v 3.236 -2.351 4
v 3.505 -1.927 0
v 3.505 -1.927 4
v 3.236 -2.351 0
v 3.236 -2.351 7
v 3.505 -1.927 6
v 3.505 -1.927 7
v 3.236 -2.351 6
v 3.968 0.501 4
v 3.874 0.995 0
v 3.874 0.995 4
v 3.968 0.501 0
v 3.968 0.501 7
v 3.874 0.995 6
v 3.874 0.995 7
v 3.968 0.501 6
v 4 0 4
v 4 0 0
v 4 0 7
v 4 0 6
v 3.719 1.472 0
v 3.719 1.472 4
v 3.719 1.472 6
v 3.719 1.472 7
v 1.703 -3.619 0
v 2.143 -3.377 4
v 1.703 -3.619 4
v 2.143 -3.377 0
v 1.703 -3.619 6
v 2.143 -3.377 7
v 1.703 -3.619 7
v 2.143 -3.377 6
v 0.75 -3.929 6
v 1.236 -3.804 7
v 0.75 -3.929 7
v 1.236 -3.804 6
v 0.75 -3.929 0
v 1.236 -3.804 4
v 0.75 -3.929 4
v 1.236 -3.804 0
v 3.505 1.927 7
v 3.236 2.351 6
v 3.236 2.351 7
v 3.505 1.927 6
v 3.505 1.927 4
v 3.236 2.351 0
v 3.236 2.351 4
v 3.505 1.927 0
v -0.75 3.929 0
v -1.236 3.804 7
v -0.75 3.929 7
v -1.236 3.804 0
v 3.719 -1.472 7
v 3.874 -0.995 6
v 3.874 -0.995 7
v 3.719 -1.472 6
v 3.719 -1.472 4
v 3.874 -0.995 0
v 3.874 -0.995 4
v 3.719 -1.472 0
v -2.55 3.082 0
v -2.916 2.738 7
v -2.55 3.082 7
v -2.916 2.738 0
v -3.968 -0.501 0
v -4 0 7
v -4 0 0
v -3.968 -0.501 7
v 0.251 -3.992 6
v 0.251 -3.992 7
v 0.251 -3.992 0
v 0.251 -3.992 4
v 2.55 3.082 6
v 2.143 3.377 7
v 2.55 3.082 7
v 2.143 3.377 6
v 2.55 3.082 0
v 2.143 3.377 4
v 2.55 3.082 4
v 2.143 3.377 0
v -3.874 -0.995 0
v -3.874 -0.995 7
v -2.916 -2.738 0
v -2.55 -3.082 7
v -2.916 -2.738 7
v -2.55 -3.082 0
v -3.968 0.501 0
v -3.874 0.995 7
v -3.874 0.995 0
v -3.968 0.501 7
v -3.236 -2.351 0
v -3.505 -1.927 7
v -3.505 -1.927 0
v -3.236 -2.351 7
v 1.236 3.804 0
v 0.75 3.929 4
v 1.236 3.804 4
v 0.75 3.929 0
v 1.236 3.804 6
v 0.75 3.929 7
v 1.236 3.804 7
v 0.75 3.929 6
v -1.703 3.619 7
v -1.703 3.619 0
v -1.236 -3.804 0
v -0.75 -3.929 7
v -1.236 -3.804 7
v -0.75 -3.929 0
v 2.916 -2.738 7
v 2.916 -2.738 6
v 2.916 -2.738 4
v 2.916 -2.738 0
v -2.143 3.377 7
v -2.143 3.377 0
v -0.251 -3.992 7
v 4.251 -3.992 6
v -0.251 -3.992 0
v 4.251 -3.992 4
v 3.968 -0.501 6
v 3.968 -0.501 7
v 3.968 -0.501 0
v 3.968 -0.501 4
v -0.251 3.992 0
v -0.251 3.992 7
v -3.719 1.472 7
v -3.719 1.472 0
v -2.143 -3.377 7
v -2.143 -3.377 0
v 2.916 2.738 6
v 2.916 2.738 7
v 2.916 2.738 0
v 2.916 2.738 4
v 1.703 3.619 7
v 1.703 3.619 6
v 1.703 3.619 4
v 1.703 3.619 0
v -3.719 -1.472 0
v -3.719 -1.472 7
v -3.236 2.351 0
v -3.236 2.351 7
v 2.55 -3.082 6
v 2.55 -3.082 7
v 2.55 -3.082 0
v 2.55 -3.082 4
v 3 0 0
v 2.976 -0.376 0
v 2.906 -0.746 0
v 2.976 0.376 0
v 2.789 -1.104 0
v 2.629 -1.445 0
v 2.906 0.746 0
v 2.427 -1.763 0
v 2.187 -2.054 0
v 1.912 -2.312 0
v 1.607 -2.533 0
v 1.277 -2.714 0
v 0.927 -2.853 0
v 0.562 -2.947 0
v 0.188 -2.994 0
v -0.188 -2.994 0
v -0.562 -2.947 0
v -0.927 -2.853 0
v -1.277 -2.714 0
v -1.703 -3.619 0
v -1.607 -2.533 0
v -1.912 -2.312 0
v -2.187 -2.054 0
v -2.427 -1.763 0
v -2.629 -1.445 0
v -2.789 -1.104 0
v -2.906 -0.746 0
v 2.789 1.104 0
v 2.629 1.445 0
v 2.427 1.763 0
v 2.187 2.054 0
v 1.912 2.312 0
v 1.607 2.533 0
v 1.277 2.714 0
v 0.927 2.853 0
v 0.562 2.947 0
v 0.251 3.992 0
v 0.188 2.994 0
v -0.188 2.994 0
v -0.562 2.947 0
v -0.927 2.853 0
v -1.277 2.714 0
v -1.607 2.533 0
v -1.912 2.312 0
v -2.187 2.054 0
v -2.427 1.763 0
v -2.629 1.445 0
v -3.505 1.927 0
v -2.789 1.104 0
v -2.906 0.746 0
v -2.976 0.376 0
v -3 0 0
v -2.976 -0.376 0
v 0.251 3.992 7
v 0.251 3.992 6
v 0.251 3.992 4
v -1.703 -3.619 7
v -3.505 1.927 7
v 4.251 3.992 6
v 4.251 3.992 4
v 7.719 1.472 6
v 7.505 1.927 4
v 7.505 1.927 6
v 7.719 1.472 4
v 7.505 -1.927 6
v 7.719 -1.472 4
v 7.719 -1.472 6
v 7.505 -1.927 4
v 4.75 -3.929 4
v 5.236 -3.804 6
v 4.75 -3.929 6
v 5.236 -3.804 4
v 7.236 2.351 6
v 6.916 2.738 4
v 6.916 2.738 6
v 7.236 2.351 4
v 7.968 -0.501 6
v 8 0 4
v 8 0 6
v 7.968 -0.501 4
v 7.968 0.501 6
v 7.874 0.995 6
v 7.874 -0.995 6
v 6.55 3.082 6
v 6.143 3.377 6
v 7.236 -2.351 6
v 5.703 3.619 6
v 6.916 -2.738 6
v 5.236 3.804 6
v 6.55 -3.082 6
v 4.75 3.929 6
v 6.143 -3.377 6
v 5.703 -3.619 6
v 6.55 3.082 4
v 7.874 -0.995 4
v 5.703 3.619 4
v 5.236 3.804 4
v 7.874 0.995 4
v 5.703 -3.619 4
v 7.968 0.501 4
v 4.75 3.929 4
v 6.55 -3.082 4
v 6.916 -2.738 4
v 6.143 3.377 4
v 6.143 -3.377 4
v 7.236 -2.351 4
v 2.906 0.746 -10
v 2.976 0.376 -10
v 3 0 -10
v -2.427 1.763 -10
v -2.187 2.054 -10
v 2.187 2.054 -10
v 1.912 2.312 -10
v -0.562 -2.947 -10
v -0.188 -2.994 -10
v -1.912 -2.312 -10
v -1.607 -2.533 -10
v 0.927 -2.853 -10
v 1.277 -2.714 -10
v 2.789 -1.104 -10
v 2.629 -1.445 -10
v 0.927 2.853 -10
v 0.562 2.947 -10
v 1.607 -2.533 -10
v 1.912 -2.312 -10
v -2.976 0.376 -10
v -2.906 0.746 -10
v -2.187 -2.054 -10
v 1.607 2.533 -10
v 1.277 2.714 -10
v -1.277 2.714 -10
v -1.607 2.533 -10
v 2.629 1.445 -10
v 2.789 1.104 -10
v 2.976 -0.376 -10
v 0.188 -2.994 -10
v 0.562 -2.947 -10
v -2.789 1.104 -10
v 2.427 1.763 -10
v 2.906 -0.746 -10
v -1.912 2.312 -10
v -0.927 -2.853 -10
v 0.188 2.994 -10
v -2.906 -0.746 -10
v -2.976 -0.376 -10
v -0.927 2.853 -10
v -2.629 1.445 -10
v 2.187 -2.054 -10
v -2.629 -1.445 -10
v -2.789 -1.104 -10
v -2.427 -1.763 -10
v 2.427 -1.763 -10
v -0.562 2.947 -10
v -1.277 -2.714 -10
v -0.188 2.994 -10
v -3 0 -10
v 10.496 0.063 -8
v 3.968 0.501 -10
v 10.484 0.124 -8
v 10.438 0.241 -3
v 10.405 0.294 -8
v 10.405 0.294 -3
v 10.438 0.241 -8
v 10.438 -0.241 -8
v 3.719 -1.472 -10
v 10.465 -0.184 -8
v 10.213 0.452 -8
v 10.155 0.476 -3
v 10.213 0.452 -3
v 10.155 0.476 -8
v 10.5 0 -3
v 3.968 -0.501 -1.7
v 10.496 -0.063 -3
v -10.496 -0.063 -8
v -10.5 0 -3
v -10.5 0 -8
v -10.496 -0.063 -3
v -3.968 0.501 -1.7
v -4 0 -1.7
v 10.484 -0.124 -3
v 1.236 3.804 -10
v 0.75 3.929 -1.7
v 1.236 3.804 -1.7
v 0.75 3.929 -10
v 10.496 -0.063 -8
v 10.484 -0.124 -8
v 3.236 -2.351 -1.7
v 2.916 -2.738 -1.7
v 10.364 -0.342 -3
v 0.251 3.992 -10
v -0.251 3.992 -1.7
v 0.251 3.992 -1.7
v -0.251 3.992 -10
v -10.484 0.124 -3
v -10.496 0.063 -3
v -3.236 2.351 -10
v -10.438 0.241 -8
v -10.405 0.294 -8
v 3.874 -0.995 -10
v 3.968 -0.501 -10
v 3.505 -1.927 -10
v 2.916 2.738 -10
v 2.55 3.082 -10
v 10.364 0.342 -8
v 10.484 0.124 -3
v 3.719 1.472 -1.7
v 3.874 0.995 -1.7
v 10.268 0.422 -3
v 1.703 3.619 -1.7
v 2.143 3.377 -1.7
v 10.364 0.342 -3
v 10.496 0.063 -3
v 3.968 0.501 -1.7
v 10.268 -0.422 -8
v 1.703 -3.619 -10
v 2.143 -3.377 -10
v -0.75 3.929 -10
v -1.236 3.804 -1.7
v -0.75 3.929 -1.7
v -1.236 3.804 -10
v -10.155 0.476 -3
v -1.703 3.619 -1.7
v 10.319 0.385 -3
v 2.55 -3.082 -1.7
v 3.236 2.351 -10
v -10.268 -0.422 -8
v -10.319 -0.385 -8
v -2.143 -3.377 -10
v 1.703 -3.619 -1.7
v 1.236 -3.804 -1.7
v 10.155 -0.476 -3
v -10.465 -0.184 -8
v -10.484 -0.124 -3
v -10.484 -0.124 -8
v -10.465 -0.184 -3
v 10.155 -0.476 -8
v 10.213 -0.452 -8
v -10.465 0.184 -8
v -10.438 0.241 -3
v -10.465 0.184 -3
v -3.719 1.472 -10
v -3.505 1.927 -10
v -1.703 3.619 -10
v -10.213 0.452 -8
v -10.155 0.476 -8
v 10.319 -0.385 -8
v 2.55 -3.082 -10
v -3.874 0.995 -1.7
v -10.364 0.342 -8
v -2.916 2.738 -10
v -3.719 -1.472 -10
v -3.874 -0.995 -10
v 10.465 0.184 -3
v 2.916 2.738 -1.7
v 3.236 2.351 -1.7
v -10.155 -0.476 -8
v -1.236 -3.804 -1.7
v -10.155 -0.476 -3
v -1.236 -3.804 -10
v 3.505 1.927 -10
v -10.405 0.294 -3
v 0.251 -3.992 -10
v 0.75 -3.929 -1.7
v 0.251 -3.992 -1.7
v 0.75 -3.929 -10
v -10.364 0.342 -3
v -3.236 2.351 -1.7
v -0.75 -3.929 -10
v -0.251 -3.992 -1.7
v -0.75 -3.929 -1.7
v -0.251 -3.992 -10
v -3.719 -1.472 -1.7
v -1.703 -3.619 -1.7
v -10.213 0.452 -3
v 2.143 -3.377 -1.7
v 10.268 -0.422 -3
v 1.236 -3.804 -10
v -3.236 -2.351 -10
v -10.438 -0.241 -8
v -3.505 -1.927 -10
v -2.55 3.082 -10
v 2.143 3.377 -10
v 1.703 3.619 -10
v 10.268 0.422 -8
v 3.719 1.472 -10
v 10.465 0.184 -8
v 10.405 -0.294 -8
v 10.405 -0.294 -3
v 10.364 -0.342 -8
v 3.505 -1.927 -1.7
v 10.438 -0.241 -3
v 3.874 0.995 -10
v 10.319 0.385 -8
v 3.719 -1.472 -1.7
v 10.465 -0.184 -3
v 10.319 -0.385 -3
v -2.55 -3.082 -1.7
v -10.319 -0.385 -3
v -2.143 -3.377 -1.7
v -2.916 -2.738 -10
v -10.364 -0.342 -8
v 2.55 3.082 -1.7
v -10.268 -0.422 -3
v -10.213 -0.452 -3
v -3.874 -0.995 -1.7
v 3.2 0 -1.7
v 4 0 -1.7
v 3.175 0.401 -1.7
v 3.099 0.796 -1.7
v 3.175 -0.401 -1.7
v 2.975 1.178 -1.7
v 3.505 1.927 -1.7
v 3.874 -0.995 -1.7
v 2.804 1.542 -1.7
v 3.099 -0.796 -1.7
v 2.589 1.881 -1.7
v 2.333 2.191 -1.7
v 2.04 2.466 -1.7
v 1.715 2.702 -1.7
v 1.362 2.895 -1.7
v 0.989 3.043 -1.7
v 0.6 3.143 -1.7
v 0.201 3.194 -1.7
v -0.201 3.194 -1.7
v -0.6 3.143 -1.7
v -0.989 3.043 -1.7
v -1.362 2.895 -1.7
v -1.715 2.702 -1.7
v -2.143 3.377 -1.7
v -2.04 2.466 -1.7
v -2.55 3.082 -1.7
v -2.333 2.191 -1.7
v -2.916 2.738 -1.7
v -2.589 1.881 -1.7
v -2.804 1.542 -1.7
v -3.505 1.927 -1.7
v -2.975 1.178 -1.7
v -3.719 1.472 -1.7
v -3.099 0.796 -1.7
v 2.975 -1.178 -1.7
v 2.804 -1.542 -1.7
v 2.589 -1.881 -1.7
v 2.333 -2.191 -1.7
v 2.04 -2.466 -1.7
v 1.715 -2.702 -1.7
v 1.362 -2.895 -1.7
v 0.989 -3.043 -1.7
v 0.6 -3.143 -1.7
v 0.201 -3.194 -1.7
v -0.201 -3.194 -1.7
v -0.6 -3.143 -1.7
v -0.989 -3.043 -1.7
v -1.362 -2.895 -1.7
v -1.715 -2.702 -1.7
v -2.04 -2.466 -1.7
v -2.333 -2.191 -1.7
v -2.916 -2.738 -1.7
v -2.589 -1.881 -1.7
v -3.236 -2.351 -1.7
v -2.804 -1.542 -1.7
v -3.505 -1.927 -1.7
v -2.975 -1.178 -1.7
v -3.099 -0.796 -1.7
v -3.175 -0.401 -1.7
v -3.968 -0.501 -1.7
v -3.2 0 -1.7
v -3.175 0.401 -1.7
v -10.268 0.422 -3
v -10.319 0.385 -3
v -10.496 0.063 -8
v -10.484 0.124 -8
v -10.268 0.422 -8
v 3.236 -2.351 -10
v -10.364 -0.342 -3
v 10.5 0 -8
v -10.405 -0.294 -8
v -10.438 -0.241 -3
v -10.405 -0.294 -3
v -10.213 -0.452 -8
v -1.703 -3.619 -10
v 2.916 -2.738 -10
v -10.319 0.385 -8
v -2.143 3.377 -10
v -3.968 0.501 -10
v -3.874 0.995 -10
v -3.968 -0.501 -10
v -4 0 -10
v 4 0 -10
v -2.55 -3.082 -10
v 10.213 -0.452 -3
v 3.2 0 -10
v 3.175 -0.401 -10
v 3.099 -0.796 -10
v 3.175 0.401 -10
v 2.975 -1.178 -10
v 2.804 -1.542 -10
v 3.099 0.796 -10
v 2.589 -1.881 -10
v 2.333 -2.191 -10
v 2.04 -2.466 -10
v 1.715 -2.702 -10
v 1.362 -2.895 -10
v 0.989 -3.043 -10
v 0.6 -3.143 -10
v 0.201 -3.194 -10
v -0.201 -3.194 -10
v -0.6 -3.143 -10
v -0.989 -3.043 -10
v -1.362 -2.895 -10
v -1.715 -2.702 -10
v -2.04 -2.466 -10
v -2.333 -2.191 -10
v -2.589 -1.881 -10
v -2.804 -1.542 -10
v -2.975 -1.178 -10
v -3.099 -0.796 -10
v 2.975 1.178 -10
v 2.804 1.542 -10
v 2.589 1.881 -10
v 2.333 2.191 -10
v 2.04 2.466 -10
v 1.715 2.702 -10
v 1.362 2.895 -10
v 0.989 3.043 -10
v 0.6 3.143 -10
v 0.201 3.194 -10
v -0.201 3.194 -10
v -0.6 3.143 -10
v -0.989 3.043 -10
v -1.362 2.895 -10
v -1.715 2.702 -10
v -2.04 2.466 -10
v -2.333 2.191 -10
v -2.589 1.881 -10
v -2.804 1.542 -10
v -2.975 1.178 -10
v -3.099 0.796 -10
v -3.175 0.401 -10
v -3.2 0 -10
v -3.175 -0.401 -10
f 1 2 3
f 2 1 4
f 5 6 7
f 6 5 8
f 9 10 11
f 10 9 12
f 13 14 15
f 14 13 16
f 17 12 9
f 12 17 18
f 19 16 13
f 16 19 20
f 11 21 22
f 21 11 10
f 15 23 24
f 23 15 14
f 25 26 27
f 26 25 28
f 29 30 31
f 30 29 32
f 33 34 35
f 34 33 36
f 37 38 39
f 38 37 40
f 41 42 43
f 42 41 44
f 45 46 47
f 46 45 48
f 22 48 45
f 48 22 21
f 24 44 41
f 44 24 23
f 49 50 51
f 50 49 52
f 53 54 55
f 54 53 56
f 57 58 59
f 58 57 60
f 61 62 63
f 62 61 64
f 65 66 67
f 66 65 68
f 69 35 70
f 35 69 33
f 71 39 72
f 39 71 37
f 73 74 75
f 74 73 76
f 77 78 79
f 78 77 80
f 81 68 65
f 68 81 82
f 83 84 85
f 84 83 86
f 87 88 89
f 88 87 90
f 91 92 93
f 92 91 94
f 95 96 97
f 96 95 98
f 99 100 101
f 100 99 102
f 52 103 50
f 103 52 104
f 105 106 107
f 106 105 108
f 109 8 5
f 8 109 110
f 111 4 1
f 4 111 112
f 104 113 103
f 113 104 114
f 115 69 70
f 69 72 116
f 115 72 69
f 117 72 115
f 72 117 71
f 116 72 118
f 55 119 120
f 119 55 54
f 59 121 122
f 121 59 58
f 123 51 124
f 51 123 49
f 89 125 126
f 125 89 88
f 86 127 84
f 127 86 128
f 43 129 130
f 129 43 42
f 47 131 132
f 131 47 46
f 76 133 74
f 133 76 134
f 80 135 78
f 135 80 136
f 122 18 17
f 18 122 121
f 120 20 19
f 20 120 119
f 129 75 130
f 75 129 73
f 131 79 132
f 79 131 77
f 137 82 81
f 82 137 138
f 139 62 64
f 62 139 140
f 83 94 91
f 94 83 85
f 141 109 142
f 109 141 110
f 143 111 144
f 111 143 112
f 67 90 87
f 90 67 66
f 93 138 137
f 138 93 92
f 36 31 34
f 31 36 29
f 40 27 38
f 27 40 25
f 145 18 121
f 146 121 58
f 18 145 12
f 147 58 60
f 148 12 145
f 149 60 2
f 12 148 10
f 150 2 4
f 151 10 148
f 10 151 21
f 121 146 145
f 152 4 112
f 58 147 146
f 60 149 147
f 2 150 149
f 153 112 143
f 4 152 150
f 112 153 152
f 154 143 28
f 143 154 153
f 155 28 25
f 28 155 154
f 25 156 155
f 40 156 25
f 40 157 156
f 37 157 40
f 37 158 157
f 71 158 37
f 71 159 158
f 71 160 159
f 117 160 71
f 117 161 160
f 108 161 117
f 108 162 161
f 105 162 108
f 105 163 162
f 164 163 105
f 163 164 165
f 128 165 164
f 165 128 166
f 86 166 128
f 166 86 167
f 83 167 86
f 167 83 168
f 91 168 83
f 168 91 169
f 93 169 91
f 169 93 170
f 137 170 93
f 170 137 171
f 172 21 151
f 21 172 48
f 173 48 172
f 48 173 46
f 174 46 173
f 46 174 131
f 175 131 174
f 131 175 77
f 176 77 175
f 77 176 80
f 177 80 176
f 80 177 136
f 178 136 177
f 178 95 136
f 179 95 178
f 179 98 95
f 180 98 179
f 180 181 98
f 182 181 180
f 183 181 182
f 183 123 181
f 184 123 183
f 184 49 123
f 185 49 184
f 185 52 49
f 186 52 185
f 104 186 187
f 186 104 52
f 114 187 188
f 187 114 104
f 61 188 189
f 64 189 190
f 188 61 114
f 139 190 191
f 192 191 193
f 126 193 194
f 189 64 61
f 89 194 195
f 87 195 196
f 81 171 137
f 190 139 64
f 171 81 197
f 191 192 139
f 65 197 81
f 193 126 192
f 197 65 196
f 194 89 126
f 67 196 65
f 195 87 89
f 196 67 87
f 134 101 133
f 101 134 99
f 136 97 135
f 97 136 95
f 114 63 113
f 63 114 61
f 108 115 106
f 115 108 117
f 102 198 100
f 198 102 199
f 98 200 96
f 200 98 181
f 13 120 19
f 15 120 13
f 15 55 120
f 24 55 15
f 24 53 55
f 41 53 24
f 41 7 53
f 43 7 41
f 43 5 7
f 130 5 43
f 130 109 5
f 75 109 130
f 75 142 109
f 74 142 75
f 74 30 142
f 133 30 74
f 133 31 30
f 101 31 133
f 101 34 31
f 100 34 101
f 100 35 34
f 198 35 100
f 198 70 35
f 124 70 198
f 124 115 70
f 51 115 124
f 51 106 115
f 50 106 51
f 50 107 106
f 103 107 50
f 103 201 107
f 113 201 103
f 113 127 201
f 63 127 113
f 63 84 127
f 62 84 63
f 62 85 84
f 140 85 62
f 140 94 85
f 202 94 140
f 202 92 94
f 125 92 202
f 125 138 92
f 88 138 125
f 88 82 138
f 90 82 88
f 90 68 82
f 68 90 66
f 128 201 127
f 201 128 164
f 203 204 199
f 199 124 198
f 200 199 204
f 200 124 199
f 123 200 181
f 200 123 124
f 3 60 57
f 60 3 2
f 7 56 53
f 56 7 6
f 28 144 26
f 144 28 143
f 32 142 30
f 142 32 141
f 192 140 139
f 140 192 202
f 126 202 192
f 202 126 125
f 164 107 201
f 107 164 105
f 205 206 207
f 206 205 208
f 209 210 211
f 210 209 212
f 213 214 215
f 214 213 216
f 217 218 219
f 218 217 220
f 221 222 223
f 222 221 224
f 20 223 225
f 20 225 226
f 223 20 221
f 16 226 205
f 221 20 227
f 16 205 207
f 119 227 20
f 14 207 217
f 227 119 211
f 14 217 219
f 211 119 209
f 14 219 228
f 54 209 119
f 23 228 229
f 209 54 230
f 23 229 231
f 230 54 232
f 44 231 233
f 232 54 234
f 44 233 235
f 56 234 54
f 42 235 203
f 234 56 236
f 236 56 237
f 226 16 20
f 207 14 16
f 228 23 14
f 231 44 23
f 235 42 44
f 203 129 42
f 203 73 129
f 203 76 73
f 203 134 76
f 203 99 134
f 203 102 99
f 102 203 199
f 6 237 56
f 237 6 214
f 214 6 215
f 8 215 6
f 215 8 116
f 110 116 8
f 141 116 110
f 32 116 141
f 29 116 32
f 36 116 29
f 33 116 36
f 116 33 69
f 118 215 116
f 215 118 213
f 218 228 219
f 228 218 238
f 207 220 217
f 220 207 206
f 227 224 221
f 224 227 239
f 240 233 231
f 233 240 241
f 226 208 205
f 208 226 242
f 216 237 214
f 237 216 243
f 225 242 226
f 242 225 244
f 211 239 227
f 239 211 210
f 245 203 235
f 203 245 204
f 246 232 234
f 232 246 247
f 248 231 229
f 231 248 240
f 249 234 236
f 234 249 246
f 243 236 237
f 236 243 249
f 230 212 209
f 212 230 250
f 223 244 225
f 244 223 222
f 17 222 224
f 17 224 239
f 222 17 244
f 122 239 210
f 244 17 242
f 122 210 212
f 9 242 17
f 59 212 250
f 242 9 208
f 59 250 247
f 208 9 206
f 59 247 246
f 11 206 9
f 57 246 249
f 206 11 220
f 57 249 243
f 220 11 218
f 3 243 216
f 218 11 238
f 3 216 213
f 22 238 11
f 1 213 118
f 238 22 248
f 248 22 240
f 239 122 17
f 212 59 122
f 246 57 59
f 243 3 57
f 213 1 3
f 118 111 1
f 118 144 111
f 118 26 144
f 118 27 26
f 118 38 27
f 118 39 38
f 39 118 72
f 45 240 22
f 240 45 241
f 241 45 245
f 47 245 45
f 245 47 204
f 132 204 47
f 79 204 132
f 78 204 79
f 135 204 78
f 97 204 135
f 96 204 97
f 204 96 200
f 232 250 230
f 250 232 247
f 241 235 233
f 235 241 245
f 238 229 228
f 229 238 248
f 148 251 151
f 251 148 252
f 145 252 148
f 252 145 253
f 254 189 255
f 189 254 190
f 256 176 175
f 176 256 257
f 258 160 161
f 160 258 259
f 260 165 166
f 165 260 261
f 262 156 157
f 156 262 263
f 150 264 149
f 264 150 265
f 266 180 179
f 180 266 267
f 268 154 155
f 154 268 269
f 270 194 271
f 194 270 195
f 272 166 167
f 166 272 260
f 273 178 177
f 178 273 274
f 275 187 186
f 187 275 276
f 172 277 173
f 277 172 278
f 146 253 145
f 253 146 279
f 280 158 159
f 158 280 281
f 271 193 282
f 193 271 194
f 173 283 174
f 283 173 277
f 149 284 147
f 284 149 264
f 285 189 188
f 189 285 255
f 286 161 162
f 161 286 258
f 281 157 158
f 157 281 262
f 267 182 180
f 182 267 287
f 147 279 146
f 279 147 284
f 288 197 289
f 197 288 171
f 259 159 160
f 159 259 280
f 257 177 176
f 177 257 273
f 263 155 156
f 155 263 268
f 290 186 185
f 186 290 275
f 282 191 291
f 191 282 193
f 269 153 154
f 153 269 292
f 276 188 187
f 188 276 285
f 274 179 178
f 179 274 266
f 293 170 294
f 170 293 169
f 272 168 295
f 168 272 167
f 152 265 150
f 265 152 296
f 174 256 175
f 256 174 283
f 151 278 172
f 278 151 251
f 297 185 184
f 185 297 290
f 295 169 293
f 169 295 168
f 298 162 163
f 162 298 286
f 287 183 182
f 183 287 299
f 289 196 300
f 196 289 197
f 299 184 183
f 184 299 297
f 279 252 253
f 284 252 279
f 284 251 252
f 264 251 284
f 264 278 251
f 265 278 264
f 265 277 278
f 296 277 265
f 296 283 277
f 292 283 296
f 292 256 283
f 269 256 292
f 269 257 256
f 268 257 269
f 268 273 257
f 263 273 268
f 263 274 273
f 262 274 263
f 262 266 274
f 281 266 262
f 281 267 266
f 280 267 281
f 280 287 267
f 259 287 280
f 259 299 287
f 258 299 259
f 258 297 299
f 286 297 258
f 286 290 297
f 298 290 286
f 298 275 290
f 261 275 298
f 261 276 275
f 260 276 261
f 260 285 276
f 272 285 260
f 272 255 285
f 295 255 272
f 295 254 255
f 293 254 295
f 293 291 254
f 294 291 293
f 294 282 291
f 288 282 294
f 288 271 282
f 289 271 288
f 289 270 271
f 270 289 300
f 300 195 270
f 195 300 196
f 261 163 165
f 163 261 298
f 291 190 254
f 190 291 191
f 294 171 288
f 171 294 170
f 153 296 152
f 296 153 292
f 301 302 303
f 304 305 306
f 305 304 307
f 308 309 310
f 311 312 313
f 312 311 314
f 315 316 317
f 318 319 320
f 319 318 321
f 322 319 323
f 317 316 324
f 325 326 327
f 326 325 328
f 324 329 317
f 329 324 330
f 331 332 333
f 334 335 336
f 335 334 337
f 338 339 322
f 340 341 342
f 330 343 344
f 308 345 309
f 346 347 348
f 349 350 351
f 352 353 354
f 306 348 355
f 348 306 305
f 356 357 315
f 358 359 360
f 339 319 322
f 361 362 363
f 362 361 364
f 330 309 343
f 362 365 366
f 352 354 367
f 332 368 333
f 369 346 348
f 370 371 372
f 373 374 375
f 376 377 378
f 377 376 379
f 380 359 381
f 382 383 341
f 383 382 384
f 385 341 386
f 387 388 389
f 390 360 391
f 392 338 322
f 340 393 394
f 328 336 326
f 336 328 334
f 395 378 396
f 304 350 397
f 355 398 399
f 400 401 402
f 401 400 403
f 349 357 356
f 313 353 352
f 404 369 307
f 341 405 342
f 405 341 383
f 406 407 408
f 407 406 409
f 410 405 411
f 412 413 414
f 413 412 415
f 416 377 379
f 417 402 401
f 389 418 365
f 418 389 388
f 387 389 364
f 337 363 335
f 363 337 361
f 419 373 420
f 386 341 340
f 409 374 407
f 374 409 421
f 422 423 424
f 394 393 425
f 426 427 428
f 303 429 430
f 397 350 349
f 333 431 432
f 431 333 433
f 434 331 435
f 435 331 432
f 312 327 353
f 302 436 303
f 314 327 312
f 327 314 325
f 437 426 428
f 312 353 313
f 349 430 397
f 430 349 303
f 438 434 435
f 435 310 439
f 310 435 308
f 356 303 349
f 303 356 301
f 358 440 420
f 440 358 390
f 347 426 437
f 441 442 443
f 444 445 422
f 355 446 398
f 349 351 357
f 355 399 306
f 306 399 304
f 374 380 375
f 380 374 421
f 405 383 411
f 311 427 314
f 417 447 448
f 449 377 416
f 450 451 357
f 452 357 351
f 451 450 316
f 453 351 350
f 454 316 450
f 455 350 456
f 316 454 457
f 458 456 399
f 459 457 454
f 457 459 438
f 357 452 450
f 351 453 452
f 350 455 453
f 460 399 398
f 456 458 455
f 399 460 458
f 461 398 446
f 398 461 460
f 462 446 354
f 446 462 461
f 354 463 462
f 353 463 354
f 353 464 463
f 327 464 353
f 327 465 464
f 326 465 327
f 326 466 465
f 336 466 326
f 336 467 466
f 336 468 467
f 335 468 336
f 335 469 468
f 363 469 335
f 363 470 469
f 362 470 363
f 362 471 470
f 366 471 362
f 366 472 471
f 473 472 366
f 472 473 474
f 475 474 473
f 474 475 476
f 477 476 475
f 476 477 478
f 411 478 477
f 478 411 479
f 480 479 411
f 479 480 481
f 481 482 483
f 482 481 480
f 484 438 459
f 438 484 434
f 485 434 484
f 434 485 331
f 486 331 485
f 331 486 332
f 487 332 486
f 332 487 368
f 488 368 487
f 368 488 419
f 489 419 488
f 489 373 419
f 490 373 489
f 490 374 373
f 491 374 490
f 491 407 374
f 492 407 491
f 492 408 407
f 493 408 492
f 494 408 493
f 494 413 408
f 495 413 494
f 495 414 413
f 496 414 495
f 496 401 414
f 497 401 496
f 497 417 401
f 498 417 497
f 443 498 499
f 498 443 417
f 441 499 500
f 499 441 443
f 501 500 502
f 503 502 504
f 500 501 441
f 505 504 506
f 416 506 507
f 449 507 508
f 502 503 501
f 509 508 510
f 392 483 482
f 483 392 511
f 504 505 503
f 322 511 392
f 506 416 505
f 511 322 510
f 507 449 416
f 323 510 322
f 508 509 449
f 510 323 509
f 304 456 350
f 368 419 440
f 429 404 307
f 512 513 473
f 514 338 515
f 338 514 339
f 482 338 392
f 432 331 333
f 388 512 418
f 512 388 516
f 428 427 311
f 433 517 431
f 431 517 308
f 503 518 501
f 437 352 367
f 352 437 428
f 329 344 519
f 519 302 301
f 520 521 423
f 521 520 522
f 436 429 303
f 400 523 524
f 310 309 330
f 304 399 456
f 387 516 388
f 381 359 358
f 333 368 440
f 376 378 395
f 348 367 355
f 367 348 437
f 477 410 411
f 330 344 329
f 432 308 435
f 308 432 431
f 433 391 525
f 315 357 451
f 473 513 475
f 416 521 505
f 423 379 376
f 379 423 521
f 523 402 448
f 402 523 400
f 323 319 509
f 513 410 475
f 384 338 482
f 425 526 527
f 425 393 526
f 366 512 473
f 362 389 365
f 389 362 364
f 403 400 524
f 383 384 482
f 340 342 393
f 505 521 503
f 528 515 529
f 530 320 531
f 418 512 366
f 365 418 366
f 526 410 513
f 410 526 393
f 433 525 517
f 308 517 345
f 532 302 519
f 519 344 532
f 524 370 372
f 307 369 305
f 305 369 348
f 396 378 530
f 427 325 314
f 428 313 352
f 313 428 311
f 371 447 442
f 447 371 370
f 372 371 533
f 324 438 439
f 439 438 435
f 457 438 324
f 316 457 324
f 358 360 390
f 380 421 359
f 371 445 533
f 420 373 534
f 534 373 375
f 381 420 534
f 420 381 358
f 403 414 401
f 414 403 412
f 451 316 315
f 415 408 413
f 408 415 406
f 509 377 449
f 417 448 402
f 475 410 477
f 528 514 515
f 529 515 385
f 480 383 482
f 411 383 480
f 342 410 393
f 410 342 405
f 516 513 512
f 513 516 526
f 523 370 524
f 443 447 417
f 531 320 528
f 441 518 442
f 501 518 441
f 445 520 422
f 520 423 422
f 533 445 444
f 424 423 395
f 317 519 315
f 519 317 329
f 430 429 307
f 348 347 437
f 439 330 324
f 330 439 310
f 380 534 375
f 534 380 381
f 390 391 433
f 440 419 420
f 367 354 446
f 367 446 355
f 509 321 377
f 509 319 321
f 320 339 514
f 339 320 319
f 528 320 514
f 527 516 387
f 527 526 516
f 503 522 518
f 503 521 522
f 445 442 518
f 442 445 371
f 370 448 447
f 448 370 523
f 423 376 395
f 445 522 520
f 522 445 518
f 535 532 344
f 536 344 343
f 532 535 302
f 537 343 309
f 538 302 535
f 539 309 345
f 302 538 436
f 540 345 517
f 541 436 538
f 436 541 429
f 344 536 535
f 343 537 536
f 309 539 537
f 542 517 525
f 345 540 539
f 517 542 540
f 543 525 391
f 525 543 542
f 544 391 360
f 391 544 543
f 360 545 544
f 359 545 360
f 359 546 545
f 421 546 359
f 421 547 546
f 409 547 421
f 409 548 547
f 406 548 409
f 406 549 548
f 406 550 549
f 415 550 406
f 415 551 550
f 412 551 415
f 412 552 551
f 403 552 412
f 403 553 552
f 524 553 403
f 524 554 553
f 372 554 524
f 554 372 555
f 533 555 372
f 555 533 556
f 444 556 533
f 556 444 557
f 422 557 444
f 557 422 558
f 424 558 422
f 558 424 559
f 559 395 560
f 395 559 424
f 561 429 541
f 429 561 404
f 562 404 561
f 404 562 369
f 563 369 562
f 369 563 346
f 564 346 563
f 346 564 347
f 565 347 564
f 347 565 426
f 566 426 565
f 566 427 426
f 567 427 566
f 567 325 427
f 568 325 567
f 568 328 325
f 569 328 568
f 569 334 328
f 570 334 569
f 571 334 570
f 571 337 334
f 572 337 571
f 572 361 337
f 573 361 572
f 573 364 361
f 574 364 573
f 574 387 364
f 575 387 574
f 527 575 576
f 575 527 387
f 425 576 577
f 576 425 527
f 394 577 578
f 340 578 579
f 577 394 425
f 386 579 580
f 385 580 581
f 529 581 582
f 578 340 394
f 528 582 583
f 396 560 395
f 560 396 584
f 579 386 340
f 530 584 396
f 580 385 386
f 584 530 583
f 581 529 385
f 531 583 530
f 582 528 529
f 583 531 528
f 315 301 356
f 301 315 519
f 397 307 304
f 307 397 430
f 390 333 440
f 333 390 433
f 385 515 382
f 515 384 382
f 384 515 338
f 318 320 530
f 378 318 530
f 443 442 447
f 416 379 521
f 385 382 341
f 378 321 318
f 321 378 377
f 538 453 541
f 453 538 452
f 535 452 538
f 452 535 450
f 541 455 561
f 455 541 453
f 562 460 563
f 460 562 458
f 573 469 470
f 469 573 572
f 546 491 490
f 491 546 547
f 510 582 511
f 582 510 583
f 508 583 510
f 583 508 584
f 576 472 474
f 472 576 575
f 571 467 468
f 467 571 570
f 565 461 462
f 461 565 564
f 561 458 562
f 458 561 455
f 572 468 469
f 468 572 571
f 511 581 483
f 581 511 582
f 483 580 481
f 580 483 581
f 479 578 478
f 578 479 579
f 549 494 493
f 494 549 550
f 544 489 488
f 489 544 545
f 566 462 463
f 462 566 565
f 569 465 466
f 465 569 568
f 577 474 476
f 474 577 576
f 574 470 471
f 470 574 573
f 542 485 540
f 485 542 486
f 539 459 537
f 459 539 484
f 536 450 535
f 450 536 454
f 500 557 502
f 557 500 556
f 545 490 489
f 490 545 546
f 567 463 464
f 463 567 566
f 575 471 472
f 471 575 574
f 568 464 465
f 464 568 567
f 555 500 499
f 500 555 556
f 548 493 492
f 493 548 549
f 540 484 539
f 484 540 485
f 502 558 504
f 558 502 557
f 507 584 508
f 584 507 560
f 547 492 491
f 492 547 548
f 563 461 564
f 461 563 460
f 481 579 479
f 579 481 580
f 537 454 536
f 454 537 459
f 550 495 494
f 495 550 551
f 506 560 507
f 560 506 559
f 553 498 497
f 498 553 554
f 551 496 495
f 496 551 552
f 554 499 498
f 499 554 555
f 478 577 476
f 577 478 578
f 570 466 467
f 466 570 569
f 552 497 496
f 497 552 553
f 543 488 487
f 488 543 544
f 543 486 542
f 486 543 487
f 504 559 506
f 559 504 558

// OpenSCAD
// file: ../planelib/ruder.scad
module RuderAdd3() // elements to ruder
{
   p0 = [-ptRuder.x * s[ruderseg] + o[ruderseg].x, o[ruderseg].z];
   p1 = [-ptRuder.x * s[ruderseg+1] + o[ruderseg+1].x, o[ruderseg+1].z];
   p2 = [-s[ruderseg+1] + o[ruderseg+1].x, o[ruderseg+1].z];
   p3 = [-s[ruderseg] + o[ruderseg].x, o[ruderseg].z];
   d0 = hRuder * s[ruderseg];
   d1 = hRuder * s[ruderseg+1];

   intersection(){
       union(){
           hull(){ // drehachse
                translate([p0.x, ptRuder.y*s[ruderseg] ,p0.y])
                cylinder(d=d0,h=0.01);
               translate([p1.x, ptRuder.y*s[ruderseg+1] ,p1.y])
                cylinder(d=d1,h=0.01);
                }

            // schnitt an der achse
           translate([0, 50/2, 0])
           rotate([90,0,0])
           linear_extrude(height=50)
           polygon([p0,p1,p2,p3]);
           }
       difference(){
           segment([s[ruderseg],s[ruderseg+1]], [o[ruderseg],o[ruderseg+1]], r=0);
           wingPolyLine( d=dPoly, pt=ptRuder, off=[+0,+0] );
           translate([0, 50/2, 0])
           rotate([90,0,0])
           linear_extrude(height=50)
           polygon([p1+[(d1+1)/2,-1],p1+[(d1+1)/2,0], p2, p2+[0,-1]]);
           }
       RuderDiff2Mask();
       }
}

module RuderAdd2() // add elements to sement
{
   p0 = [-ptRuder.x * s[ruderseg] + o[ruderseg].x, o[ruderseg].z];
   p1 = [-ptRuder.x * s[ruderseg+1] + o[ruderseg+1].x, o[ruderseg+1].z];
   p2 = [-s[ruderseg+1] + o[ruderseg+1].x, o[ruderseg+1].z];
   p3 = [-s[ruderseg] + o[ruderseg].x, o[ruderseg].z];
   p4 = [+ o[ruderseg+1].x, o[ruderseg+1].z];
   p5 = [+ o[ruderseg].x, o[ruderseg].z];
   d0 = hRuder * s[ruderseg];
   d1 = hRuder * s[ruderseg+1];

   intersection(){
       union(){
           hull(){ // drehachse
                translate([p0.x, ptRuder.y*s[ruderseg] ,p0.y])
                cylinder(d=d0,h=0.01);
               translate([p1.x, ptRuder.y*s[ruderseg+1] ,p1.y])
                cylinder(d=d1,h=0.01);
                }

            // schnitt an der achse
           translate([0, 50/2, 0])
           rotate([90,0,0])
           linear_extrude(height=50)
           polygon([p0,p1,p4,p5]);
           }
       difference(){
           segment([s[ruderseg],s[ruderseg+1]], [o[ruderseg],o[ruderseg+1]], r=0);
           wingPolyLine( d=dPoly, pt=ptRuder, off=[+0,+0] );
           translate([0, 50/2, 0])
           rotate([90,0,0])
           linear_extrude(height=50)
           *polygon([p1+[(d1+1)/2,-1],p1+[(d1+1)/2,0], p2, p2+[0,-1]]);
           }
       RuderDiff2MaskInv();
       }
}

module RuderCut2() // cut the ruder from segmen
{
   p0 = [-ptRuder.x * s[ruderseg] + o[ruderseg].x, o[ruderseg].z];
   p1 = [-ptRuder.x * s[ruderseg+1] + o[ruderseg+1].x, o[ruderseg+1].z];
   p2 = [-s[ruderseg+1] + o[ruderseg+1].x, o[ruderseg+1].z];
   p3 = [-s[ruderseg] + o[ruderseg].x, o[ruderseg].z];
   d0 = hRuder * s[ruderseg];
   d1 = hRuder * s[ruderseg+1];

    // schnitt an der achse
   translate([0, 50/2, 0])
    rotate([90,0,0])
     linear_extrude(height=50)
      polygon([p0,p1,p2,p3]);
   RuderDiff2Axis( rot = 400, doff=-0.5 );
}

module RuderCut3() // cut the segment from the ruder
{
   p0 = [-ptRuder.x * s[ruderseg] + o[ruderseg].x, o[ruderseg].z];
   p1 = [-ptRuder.x * s[ruderseg+1] + o[ruderseg+1].x, o[ruderseg+1].z];
   p2 = [-s[ruderseg+1] + o[ruderseg+1].x, o[ruderseg+1].z];
   p3 = [-s[ruderseg] + o[ruderseg].x, o[ruderseg].z];
   p4 = [+ o[ruderseg+1].x, o[ruderseg+1].z];
   p5 = [+ o[ruderseg].x, o[ruderseg].z];
   d0 = hRuder * s[ruderseg];
   d1 = hRuder * s[ruderseg+1];

    // schnitt an der achse
   translate([0, 50/2, 0])
    rotate([90,0,0])
     linear_extrude(height=50)
      polygon([p0,p1,p4,p5]);
   RuderDiff2Axis( rot = 400, doff=-0.5 );
}

module RuderDiff2( doff = 0.5 ) // cut element from segment
{
   intersection(){
        RuderDiff2Axis( rot = 0, doff=0 );
        RuderDiff2Mask( doff=0 );
        }
   RuderDiff2Axis( rot = 0, doff = -doff );
}

module RuderDiff3( doff = 0.5 ) // cut elements from ruder
{
    difference(){
        RuderDiff2Axis( rot = 180, doff=0 );
        RuderDiff2Mask( doff = +doff );
        }
    RuderDiff2Axis( rot = 180, doff = -doff );
    translate([-s[ruderseg],-50,0]+o[ruderseg]) cube( [100,100,doff], center=false );
    translate([-s[ruderseg+1],-50,-doff]+o[ruderseg+1]) cube( [100,100,doff], center=false );
    
   
}


module RuderDiff2Mask( doff = 0.5 )
{   //todo: this has to depend on o,s...
    translate([-150,0,50]+o[ruderseg]) cube( [100,50,50-doff], center=true );
    translate([-150,0,150]+o[ruderseg]) cube( [100,50,50-doff], center=true );
}
module RuderDiff2MaskInv( doff = 0.5 )
{   //todo: this has to depend on o,s...
    translate([-170,0,0]+o[ruderseg]) cube( [100,50,50-doff], center=true );
    translate([-160,0,100]+o[ruderseg]) cube( [100,50,50-doff], center=true );
    translate([-150,0,200]+o[ruderseg]) cube( [100,50,50-doff], center=true );
}

// axis with rotation limits used as mask
module RuderDiff2Axis( rot=0, doff=0 )
{
   p0 = [-ptRuder.x * s[ruderseg] + o[ruderseg].x, o[ruderseg].z];
   p1 = [-ptRuder.x * s[ruderseg+1] + o[ruderseg+1].x, o[ruderseg+1].z];
   d0 = hRuder * s[ruderseg] - doff;
   d1 = hRuder * s[ruderseg+1] - doff;
   w = 40; // max ruder angle

   
  hull(){ 
    translate([p0.x, ptRuder.y*s[ruderseg] ,p0.y]) {
        cylinder( d=d0, h=0.01, center=false );
        if( rot < 360 ){
            rotate([0,0,rot+w]) translate([-2*d0,-d0/2,0]) cube([2*d0, d0, 0.01], center=false );
            rotate([0,0,rot-w]) translate([-2*d0,-d0/2,0]) cube([2*d0, d0, 0.01], center=false );
            }
        }
    translate([p1.x, ptRuder.y*s[ruderseg+1] ,p1.y]) {
        cylinder( d=d1, h=0.01, center=false );
        if( rot < 360 ){
            rotate([0,0,rot+w]) translate([-2*d1,-d1/2,0]) cube([2*d1, d1, 0.01], center=false );
            rotate([0,0,rot-w]) translate([-2*d1,-d1/2,0]) cube([2*d1, d1, 0.01], center=false );
            }
        }
    }
}

module RuderHorn()
{

    p0 = [-ptRuder.x * s[ruderseg] + o[ruderseg].x, o[ruderseg].z];
    p1 = [-ptRuder.x * s[ruderseg+1] + o[ruderseg+1].x, o[ruderseg+1].z];
    pm = (p0 + p1)/2;
    sm = (s[ruderseg]+s[ruderseg+1])/2;

    translate([pm.x,ptRuder.y*sm ,pm.y + 24 ])
    rotate([0,ruderrot, 2])
    difference()
    {
        hull()
        {
            translate([-5,2,0]) cylinder(d=2,h=4);
            translate([2,12,0]) cylinder(d=6,h=2);
            translate([-20,0,0]) cylinder(d=2,h=4);
        }
        translate([2,12,0]) cylinder(d=1.5,h=2);
   }
}
// file: ../planelib/servo.scad
servo_size_1 = [25.5,12,37];  // mg90s
servo_size_2 = [33.5,12,3];

*servo_sg90($fn=50);

module servo_sg90()
{
        cube( servo_size_1, center=true );
        translate([0,0,3.5]) 
            cube( servo_size_2, center=true );
        // servoarm...
        translate([-5,6,17])
        resize([60,12,6])
        sphere( d=1 );
}
    

module ServoDiff( i=ruderseg, sy=7 )
{ 
    sx = s[i]*(tubeOffset1+tubeOffset2)/2;  // between the tubes
    sz = (o[i+1].z-o[i].z)/2;   // in the middle of the segment
    translate( o[i] + [-sx, sy, sz])
            rotate([0,ruderrot, 2])
                servo_sg90();
                
    
    // kabelkanal
    *translate( o[i] + [-sx+10, +11-2-2, hz/2-13])
            rotate([0,90,4])
                cube([12,5,10]);
}
// file: ../planelib/polyline.scad
module wingPolyLine( d=3, pt=[0,0], off=[0,0]  )
{
    *echo(pt);
    l = len(s)-1; 
    poly = [         [o[0].x - s[0]*pt.x - off.x , o[0].y + s[0]*pt.y + off.y,  o[0].z - 20 ],
        for(i=[0:l]) [o[i].x - s[i]*pt.x - off.x , o[i].y + s[i]*pt.y + off.y,  o[i].z ],
                     [o[l].x - s[l]*pt.x - off.x , o[l].y + s[l]*pt.y + off.y,  o[l].z + 20 ] ];
    *echo( poly);
    for( i=[0:(len(poly)-2)] ){
        hull(){
            translate(poly[i]) 
                sphere( d=d );
            translate(poly[i+1]) 
                sphere( d=d );
            }
        }
}

module fusePolyLine( d=3, size=605, off=[0,0], p=pClarkFusePolyUp )
{
    for( i=[0:(len(p)-2)] ){
        hull(){
            translate([p[i].x*size, p[i].y*size+off.y, +off.x]) 
                sphere( d=d );
            translate([p[i+1].x*size, p[i+1].y*size+off.y, +off.x]) 
                sphere( d=d );
            }
        *echo( p[i] );
        }
}

module fusePolyLineQ( d=3, size=605, pt=[0,0], off=[0,0] )
{
    poly = [        
                    [o[1].x - s[1]*pt.x - off.x , o[1].y + s[1]*pt.y + off.y,  +o[1].z ],
                    [o[0].x - s[0]*pt.x - off.x , o[0].y + s[0]*pt.y + off.y,  +o[0].z ],
                    [o[0].x - s[0]*pt.x - off.x , o[0].y + s[0]*pt.y + off.y,  -o[0].z ], 
                    [o[1].x - s[1]*pt.x - off.x , o[1].y + s[1]*pt.y + off.y,  -o[1].z ]
                    ];
                    
        for( i=[0:(len(poly)-2)] ){
                hull(){
                    translate(poly[i]) 
                        sphere( d=d );
                    translate(poly[i+1]) 
                        sphere( d=d );
                    }
        }
}

module offsetPolyLine(  d=3, size=605, off=10, p=pClarkY )  // this does not yet work, just a test.
{
    for( i=[0:(len(p)-1)] ){
        po = size * p[i];
        pv = size * ((i>0) ? p[i-1] : p[len(p)-1]);
        pn = size * ((i>(len(p)-2)) ? p[0] : p[i+1]);

        pop = (pv + pn)/2 + po;
        p02 = pn - po;
        z = p02.x * pop.y + p02.y * pop.x;
        
        pt = sign( z ) * pop * (off/norm(pop));
       

        
        hull(){
            translate([po.x+pt.x, po.y+pt.y, 0]) 
                sphere( d=d );
            translate([pn.x+pt.x, pn.y+pt.y, 0]) 
                sphere( d=d );
            }
        echo( po, pop, z );
    }
}
// file: ../planelib/wing.scad
module segment( s, o, r=0, p=pSD6060, begin=0, end=1 )
{
    factor = ( s[1] ) / ( s[0] );
    height = ( o[1].z - o[0].z );
    sx = ( o[1].x - o[0].x ) / height;
    sy = ( o[1].y - o[0].y ) / height;
    
    m=[ [ 1, 0,  sx, 0],
        [ 0, 1,  sy, 0],
        [ 0, 0,  1,  0],
        [ 0, 0,  0,  1] ];
    
    translate(o[0])
        multmatrix(m)
            linear_extrude( height=height, scale=factor, convexity=10 ) 
                intersection()
                {
                    spant2d( s=s[0], r=r, p=p );
                    scale(s) 
                        mirror([1,0]) // vgl spant2d()
                            translate( [begin,-0.5] ) 
                                square( [(end-begin), 1] );
                }
}


module spant3d( d=0.3, offset=[0,0,0], size=100, r=0, p=pSD6060 )
{
    translate(offset) linear_extrude( d, convexity=10 ) spant2d(size,r,p);
}

module spant3dDiff( d=0.3, offset=[0,0,0], size=100, rot=[0,0,0], ra=0, ri=-2.5, p=pSD6060 )
{
    translate(offset) rotate(rot) translate([0,0,-d/2]) linear_extrude( height=d, convexity=10 )
    difference()
    {
        spant2d( s=size, r=ra, p=p );
        spant2d( s=size, r=ri, p=p );
    }
}

module spant2d(s=1, r=0, p=pSD6060 )
{
    offset(delta=r)
    //alternative: offset(r=r)
    scale(s)
    mirror([1,0])  // sollte das weg?
    polygon(p);
}
// file: ../planelib/skin.scad
module outerSkin( d=1, h=0, center=true )
{
    hgt = (h<=0) ? h : 2*d;
    difference(){
        minkowski(){
            children();
            cylinder(r=d,h=hgt,center=center ); 
        }
        children();
    }
}

module outerSkin2( d=1, h=0, center=true )
{
    hgt = (h<=0) ? h : 2*d;
    difference(){
        minkowski(){
            children(0);
            cylinder(r=d,h=hgt,center=center ); 
        }
        children(1);
    }
}

module innerSkin( )
{
    difference(){
        children(0);
        children(1);    
        }
}

module skin2()
{
    difference()
    {
        minkowski()
        {
            children(0);
            children(1);    
        }
        children(0);
    }
}

module Slice( )
{
    intersection()
    {
        children(0);
        children(1);
    }
}

module gridSlice( dy=30, angy=30, grid=2, dim=1000 )
{
    Slice(){
        children();
        for(z=[-dim:dy:dim], angy=[-angy,+angy])  
            translate([0,0,z])  
                rotate([0,angy,0])
                    cube([dim,dim,grid], center=true );
    }

}

module linearSlice( sh=100, sx=100, org=[0,0,0], rot=[0,0,0], center=true )
{
    Slice()
    {
        children();
        translate( org + [0,0,+sh/2] )
            rotate( rot )
                cube( [4*sx,2*sx,sh], center=center );
    }
}

module radialSlice( sh=100, sx=100, org=[0,0,0], rot=[0,0,0], mode=0, center=true )
{
    Steps = 120;
    Slice()
    {
        children();
        translate( org + [0,0,0] )
            rotate( rot )
                radialSliceHelper( d=2*sx, sh=sh, mode, center );
    }
}

module radialSliceHelper( d, sh, mode=0, center=true )
{
    gap = 0.5;
    
    if( mode==0 ){
        cylinder( d=d, h=sh, center=center );
        }
            
    if( mode==1 ){
        difference(){
            union(){
                cylinder( d=d, h=sh, center=center );
                for( r=[0:120:360] )
                    translate([0,0,0]) rotate([0,90,r]) cylinder( d=10, h=d, center=center );
                }
            union(){
                for( r=[0:120:360] )
                    translate([0,0,sh]) rotate([0,90,r]) cylinder( d=10+0.2, h=d, center=center );
                }
            }
        }
 //hier war der marker..       
    if( mode==2 ){
        cx=5;
        cy=d/10;
        difference(){
            union(){
                cylinder( d=d, h=sh, center=center );
                for( r=[0:90:360] )
                    translate([0,0,0]) rotate([0,90,r]) cube([cx,cy,d],center=false); // d is diameter, cx,cy is size
                }
            union(){
                for( r=[0:90:360] )
                    translate([0,0,sh]) 
                        rotate([0,90,r]) 
                            translate([-gap,-gap/2,0])
                                cube([cx+gap*2,cy+gap,d],center=false);
                }
            }
        }
}

module show( d = [10,10,10] )
{
    for( i=[0:$children-1] )
    {
    translate( i * d )
        children(i);
    }
}
// main file
include <../planelib/inspectoer.scad>

fuseCoverHook( false );
